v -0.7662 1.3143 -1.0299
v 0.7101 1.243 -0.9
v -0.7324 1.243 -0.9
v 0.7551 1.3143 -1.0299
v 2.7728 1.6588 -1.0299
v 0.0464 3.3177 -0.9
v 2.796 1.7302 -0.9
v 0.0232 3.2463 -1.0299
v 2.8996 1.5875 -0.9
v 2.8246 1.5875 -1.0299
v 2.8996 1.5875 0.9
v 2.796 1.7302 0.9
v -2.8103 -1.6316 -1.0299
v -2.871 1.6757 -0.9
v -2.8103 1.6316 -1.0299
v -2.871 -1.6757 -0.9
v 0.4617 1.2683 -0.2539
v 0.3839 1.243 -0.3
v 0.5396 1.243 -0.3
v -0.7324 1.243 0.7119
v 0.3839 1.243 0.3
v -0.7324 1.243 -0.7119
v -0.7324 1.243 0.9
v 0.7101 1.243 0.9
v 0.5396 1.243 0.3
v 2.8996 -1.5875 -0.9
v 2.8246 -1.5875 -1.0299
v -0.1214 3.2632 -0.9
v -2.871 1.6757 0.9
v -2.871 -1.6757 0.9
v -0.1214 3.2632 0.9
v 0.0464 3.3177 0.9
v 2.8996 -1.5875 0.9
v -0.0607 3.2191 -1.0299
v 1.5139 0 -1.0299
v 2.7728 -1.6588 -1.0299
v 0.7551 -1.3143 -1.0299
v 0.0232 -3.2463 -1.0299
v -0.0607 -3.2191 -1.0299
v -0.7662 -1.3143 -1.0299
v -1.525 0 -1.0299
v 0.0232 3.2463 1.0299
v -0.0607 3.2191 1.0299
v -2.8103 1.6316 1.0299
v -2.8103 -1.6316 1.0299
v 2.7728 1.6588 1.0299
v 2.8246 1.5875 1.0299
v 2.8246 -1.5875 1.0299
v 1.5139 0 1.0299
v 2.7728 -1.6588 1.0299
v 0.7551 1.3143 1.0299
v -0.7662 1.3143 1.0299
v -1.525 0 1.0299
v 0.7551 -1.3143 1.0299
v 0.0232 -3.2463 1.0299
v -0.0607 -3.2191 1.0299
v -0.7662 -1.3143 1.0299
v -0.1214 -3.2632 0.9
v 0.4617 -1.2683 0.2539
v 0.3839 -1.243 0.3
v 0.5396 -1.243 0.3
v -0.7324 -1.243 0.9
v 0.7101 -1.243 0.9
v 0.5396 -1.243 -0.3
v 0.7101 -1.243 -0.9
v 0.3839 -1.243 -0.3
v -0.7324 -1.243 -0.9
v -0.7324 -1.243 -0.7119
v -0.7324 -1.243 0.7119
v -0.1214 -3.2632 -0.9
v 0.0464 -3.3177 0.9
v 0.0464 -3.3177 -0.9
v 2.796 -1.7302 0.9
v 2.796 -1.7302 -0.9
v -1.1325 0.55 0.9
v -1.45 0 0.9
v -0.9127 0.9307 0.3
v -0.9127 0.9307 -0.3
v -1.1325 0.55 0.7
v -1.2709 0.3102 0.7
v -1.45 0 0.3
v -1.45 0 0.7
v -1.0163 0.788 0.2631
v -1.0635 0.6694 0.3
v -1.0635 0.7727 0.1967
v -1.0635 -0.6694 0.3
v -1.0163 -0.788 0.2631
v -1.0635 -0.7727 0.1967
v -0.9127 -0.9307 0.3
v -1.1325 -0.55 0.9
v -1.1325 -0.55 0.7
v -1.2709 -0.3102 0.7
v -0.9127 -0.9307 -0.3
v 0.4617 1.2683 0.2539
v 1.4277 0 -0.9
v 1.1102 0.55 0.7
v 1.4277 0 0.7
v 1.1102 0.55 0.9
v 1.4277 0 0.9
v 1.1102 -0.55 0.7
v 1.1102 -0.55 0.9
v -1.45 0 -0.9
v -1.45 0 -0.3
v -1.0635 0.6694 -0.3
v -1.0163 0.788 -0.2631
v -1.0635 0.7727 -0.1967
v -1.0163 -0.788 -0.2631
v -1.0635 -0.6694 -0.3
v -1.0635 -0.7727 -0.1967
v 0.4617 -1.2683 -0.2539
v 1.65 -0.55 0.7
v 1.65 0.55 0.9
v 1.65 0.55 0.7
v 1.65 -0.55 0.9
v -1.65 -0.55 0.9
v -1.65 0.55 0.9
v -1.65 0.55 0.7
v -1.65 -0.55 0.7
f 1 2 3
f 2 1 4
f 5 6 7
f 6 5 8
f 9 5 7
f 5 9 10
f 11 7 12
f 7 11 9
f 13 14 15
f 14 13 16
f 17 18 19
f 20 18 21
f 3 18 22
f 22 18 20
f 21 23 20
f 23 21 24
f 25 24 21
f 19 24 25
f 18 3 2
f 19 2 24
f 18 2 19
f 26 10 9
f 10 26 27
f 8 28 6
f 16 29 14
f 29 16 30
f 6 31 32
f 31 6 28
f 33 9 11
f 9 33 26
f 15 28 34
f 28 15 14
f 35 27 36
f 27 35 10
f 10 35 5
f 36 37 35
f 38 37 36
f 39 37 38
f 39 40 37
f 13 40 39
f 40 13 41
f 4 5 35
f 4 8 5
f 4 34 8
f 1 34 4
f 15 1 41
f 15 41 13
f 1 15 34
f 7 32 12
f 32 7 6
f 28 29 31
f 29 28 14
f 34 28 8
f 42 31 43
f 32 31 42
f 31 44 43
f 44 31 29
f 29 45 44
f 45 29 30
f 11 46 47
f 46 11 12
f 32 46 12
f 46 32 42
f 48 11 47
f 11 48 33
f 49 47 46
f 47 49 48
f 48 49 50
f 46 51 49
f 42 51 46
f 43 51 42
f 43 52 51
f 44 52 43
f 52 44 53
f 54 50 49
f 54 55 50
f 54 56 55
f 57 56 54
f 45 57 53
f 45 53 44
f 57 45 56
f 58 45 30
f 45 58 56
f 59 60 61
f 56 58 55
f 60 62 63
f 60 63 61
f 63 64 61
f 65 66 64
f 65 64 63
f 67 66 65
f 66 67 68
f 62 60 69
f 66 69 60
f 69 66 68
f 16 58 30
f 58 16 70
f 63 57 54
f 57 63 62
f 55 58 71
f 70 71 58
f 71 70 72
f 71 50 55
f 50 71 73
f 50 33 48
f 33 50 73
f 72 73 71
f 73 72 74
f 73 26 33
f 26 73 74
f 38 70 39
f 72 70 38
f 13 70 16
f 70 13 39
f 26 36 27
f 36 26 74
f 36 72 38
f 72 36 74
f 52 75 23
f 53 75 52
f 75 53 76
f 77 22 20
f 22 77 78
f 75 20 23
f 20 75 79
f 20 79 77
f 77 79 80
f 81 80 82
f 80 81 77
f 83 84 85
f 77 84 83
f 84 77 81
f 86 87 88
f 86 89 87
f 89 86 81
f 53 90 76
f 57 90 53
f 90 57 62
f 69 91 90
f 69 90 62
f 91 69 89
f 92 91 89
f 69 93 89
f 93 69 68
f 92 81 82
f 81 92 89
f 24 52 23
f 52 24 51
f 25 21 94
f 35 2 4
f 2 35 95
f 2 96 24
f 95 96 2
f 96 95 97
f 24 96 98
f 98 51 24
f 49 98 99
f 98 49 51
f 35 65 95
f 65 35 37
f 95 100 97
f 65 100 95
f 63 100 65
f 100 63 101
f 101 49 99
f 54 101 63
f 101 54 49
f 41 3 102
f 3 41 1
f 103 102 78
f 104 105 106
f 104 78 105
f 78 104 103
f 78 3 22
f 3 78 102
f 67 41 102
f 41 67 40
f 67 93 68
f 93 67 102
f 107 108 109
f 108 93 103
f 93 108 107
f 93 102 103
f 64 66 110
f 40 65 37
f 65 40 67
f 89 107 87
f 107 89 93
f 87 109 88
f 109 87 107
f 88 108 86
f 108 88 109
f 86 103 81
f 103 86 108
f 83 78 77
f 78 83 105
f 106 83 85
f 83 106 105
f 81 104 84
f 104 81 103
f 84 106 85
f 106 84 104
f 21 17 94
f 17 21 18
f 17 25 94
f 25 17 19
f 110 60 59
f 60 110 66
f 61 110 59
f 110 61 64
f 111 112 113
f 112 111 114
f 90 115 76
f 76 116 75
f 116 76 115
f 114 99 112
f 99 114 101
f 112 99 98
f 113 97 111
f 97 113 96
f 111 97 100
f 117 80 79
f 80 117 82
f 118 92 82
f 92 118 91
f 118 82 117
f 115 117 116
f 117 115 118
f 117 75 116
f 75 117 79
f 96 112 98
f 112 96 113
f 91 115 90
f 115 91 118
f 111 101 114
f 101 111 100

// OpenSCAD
// Parameters
across_flats = 5.5; //[2.75:11:0.05]
thickness = 1.8; //[0.9:3.6:0.05]
hole_diameter = 3.2; //[2.6:4.2:0.05]
chamfer = 0.2; //[0.1:0.6:0.05]
overlap = 0.6; //[0.2:1.5:0.05]
hex_radius = 3.175; //[1.5:6.5:0.01]
chamfer_radius_delta = 0.231; //[0.05:1:0.001]
thread_detail_diameter = 3.0; //[2.5:3.6:0.05]
thread_detail_height = 0.6; //[0.2:1.2:0.05]
fillet_radius = 0.15; //[0.05:0.4:0.05]

// Base Shapes
module hex_nut_body() {
  rotate([0, 0, 30])
    cylinder(r=hex_radius, h=thickness, center=true, $fn=6);
}

module hex_nut_body_chamfered_outer() {
  rotate([0, 0, 30])
    cylinder(r=hex_radius - chamfer_radius_delta, h=thickness - 2*chamfer, center=true, $fn=6);
}

module center_hole() {
  cylinder(r=hole_diameter/2, h=thickness + 2*overlap, center=true);
}

module threaded_hole_detail() {
  cylinder(r=thread_detail_diameter/2, h=thread_detail_height, center=true);
}

module fillets_sphere() {
  sphere(r=fillet_radius);
}

module engraved_markings() {
  translate([0, 0, thickness/2 - chamfer/2])
    cube([across_flats*0.6, across_flats*0.2, chamfer], center=true);
}

// Operations
module edge_chamfers() {
  hull() {
    hex_nut_body();
    hex_nut_body_chamfered_outer();
  }
}

module nut_with_hole() {
  difference() {
    edge_chamfers();
    center_hole();
  }
}

module nut_with_thread_detail() {
  difference() {
    nut_with_hole();
    threaded_hole_detail();
  }
}

module nut_with_fillets() {
  minkowski() {
    nut_with_thread_detail();
    fillets_sphere();
  }
}

module final_nut() {
  difference() {
    nut_with_fillets();
    engraved_markings();
  }
}

// Final Output
color("Silver") final_nut();
